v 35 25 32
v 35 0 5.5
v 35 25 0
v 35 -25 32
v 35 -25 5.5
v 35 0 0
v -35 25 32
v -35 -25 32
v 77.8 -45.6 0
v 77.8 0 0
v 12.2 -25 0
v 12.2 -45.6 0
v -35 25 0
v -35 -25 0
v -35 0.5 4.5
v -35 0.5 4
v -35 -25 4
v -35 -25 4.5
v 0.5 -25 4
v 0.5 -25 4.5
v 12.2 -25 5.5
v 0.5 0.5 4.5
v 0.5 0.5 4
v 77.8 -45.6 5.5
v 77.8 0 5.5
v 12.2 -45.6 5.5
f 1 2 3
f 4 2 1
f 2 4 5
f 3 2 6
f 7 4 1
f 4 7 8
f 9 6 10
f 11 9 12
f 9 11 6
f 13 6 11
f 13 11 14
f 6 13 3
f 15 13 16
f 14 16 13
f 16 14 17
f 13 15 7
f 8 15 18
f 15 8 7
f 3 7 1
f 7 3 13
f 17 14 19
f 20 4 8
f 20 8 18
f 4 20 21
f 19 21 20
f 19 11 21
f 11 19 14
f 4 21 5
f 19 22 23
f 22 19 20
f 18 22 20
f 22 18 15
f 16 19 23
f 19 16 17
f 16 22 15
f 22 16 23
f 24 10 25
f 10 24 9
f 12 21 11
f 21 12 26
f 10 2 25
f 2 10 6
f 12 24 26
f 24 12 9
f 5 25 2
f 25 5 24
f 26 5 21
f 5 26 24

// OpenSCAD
// Two-part enclosure for a small electronics board (e.g., Arduino-based logger)
// Print orientation: both parts lie on the bed, side by side, open faces up.

// ---------------- Parameters ----------------
box_x      = 70;    // box outer length (X)
box_y      = 50;    // box outer width (Y)
box_h      = 30;    // box outer height (Z)
wall       = 2;     // box wall thickness
floor      = 2;     // box floor thickness

lip_t      = 1.5;   // lid lip thickness
lip_h      = 4;     // lid lip height
lip_x      = 65.6;  // lip outer length (X)
lip_y      = 45.6;  // lip outer width (Y)
lip_over   = 0.2;   // lip overlap into box opening (clearance on each side)

eps        = 0.5;   // cutter overshoot past faces
gap        = 10;    // horizontal gap between the two parts

$fn = 64;

// ---------------- Model ----------------
union() {
    // Part 1: Box (open top)
    translate([-box_x/2, -box_y/2, 0])
        difference() {
            cube([box_x, box_y, floor + wall + box_h - wall]);
            // open the top face, cut through the lid plate
            translate([-box_x/2 - eps, -box_y/2 - eps, floor + wall])
                cube([box_x + 2*eps, box_y + 2*eps, eps]);
        }

    // Part 2: Lid (printed upside down: plate on bed, lip pointing up)
    translate([box_x/2 + gap, -lip_y/2, 0])
        union() {
            // base plate
            translate([-lip_x/2, -lip_y/2, 0])
                cube([lip_x, lip_y, lip_t]);
            // rectangular lip wall, centred on the plate
            translate([-lip_x/2, -lip_y/2, lip_t])
                cube([lip_x, lip_y, lip_h]);
        }
}
